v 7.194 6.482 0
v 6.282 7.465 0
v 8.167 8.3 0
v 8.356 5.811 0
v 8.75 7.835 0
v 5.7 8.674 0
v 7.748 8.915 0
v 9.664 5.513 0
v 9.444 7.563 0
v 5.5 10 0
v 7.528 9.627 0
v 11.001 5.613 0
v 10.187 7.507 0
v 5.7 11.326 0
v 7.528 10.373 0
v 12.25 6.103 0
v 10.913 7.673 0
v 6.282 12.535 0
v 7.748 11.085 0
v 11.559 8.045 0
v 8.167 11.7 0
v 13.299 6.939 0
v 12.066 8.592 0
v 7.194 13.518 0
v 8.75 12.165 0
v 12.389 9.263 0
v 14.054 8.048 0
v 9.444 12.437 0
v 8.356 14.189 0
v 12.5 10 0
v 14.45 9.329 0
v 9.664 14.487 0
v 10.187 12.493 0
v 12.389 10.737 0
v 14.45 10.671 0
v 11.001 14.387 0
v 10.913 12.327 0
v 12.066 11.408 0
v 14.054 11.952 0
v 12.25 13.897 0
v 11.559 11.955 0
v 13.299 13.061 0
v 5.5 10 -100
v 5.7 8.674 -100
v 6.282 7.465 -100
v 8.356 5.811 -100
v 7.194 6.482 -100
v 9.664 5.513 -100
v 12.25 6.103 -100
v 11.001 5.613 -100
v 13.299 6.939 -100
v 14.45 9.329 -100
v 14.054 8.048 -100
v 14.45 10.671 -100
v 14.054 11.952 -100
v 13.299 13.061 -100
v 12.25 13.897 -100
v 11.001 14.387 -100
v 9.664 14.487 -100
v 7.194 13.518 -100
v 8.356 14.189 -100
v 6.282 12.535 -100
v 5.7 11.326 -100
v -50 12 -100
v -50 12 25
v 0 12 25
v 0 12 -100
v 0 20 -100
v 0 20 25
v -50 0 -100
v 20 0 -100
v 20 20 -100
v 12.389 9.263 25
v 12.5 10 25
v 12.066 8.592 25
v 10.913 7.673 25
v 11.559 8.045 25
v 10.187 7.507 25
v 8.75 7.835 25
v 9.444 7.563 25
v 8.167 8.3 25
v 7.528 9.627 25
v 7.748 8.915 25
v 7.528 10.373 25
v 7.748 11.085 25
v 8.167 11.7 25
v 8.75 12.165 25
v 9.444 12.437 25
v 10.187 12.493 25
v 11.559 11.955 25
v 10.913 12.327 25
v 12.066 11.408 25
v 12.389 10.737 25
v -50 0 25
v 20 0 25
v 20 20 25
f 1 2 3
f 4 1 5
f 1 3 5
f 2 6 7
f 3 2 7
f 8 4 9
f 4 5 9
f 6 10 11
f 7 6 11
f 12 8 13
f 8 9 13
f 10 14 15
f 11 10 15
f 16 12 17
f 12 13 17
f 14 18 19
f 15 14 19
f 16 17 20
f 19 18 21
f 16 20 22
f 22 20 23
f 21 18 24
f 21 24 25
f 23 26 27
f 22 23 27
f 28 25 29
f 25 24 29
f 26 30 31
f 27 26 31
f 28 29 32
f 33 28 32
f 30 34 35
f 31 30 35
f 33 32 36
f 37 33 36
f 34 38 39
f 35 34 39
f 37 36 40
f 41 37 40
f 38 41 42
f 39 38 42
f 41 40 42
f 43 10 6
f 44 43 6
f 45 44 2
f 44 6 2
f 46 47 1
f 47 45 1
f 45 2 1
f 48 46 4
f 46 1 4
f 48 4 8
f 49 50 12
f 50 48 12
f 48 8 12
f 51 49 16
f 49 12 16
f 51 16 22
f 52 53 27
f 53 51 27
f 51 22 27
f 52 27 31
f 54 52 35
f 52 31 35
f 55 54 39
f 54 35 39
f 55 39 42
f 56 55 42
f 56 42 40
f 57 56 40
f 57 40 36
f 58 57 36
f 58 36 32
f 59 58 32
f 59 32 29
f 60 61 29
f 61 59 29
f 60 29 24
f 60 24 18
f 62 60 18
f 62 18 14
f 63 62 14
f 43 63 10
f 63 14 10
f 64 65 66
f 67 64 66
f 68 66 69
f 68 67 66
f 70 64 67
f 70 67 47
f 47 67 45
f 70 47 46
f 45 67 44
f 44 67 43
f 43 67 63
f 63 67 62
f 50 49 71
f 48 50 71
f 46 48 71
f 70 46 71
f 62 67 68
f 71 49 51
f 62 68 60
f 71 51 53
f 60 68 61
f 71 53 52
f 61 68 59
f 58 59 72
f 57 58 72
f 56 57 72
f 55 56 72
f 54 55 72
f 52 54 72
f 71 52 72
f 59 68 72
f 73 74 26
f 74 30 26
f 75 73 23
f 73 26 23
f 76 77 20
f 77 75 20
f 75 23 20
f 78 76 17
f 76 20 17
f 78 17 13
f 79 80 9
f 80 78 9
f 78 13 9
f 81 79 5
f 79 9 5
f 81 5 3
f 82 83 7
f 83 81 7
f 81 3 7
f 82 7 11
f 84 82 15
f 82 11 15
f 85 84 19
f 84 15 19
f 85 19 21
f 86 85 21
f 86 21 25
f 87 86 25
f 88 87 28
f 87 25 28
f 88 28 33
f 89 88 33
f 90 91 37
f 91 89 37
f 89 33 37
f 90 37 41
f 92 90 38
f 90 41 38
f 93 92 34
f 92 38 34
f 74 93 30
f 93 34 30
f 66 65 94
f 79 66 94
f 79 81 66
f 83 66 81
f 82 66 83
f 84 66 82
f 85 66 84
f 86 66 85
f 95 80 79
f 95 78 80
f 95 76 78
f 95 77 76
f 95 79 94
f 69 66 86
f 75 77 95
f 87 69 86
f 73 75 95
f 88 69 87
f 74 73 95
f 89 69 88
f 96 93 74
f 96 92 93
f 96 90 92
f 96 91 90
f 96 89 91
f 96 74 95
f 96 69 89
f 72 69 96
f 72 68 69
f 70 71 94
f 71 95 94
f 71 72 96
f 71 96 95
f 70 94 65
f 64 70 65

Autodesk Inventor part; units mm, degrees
ref_plane "YZ Plane" through (0, 0, 0) normal (1, 0, 0) x (0, 1, 0)
ref_plane "XZ Plane" through (0, 0, 0) normal (0, 1, 0) x (-1, 0, 0)
ref_plane "XY Plane" through (0, 0, 0) normal (0, 0, 1) x (1, 0, 0)
sketch "Sketch1" plane through (0, 0, 0) normal (0, 0, 1) x (1, 0, 0)
  line L0 (0, 20) -> (20, 20)
  line L1 (20, 20) -> (20, 0)
  line L2 (20, 0) -> (0, 0)
  line L3 (0, 0) -> (0, 20)
  circle A0 centre (10, 10) radius 2.5
  dimension "d0" = 20
  dimension "d1" = 20
  dimension "d5" = 10
  dimension "d6" = 10
  dimension "d7" = 5
extrude "Extrusion2" add sketch "Sketch1" along normal blind 25
sketch "Sketch3" plane through (0, 0, 0) normal (0, 0, -1) x (-1, 0, 0)
  line L0 (-20, 20) -> (0, 20) projected
  line L1 (0, 20) -> (0, 0) projected
  line L2 (-20, 20) -> (0, 20)
  line L3 (0, 20) -> (0, 0)
  line L4 (0, 0) -> (-20, 0)
  line L5 (-20, 0) -> (-20, 20)
  circle A0 centre (-10, 10) radius 4.5
  dimension "d10" = 9
extrude "Extrusion3" add sketch "Sketch3" along normal blind 100
sketch "Sketch4" plane through (0, 0, 25) normal (0, 0, 1) x (1, 0, 0)
  line L0 (0, 0) -> (20, 0) projected
  line L1 (0, 0) -> (-50, 0)
  line L2 (-50, 0) -> (-50, 12)
  line L3 (-50, 12) -> (0, 12)
  line L4 (0, 12) -> (0, 0)
  point P0 (0, 6)
  dimension "d13" = 12
  dimension "d14" = 50
extrude "Extrusion4" add sketch "Sketch4" against normal blind 125
equation "\"d1\" = d0"
equation "\"d5\" = 0.5 * d0"
equation "\"d6\" = d5"
properties part number "Touchscreen mount v04"
